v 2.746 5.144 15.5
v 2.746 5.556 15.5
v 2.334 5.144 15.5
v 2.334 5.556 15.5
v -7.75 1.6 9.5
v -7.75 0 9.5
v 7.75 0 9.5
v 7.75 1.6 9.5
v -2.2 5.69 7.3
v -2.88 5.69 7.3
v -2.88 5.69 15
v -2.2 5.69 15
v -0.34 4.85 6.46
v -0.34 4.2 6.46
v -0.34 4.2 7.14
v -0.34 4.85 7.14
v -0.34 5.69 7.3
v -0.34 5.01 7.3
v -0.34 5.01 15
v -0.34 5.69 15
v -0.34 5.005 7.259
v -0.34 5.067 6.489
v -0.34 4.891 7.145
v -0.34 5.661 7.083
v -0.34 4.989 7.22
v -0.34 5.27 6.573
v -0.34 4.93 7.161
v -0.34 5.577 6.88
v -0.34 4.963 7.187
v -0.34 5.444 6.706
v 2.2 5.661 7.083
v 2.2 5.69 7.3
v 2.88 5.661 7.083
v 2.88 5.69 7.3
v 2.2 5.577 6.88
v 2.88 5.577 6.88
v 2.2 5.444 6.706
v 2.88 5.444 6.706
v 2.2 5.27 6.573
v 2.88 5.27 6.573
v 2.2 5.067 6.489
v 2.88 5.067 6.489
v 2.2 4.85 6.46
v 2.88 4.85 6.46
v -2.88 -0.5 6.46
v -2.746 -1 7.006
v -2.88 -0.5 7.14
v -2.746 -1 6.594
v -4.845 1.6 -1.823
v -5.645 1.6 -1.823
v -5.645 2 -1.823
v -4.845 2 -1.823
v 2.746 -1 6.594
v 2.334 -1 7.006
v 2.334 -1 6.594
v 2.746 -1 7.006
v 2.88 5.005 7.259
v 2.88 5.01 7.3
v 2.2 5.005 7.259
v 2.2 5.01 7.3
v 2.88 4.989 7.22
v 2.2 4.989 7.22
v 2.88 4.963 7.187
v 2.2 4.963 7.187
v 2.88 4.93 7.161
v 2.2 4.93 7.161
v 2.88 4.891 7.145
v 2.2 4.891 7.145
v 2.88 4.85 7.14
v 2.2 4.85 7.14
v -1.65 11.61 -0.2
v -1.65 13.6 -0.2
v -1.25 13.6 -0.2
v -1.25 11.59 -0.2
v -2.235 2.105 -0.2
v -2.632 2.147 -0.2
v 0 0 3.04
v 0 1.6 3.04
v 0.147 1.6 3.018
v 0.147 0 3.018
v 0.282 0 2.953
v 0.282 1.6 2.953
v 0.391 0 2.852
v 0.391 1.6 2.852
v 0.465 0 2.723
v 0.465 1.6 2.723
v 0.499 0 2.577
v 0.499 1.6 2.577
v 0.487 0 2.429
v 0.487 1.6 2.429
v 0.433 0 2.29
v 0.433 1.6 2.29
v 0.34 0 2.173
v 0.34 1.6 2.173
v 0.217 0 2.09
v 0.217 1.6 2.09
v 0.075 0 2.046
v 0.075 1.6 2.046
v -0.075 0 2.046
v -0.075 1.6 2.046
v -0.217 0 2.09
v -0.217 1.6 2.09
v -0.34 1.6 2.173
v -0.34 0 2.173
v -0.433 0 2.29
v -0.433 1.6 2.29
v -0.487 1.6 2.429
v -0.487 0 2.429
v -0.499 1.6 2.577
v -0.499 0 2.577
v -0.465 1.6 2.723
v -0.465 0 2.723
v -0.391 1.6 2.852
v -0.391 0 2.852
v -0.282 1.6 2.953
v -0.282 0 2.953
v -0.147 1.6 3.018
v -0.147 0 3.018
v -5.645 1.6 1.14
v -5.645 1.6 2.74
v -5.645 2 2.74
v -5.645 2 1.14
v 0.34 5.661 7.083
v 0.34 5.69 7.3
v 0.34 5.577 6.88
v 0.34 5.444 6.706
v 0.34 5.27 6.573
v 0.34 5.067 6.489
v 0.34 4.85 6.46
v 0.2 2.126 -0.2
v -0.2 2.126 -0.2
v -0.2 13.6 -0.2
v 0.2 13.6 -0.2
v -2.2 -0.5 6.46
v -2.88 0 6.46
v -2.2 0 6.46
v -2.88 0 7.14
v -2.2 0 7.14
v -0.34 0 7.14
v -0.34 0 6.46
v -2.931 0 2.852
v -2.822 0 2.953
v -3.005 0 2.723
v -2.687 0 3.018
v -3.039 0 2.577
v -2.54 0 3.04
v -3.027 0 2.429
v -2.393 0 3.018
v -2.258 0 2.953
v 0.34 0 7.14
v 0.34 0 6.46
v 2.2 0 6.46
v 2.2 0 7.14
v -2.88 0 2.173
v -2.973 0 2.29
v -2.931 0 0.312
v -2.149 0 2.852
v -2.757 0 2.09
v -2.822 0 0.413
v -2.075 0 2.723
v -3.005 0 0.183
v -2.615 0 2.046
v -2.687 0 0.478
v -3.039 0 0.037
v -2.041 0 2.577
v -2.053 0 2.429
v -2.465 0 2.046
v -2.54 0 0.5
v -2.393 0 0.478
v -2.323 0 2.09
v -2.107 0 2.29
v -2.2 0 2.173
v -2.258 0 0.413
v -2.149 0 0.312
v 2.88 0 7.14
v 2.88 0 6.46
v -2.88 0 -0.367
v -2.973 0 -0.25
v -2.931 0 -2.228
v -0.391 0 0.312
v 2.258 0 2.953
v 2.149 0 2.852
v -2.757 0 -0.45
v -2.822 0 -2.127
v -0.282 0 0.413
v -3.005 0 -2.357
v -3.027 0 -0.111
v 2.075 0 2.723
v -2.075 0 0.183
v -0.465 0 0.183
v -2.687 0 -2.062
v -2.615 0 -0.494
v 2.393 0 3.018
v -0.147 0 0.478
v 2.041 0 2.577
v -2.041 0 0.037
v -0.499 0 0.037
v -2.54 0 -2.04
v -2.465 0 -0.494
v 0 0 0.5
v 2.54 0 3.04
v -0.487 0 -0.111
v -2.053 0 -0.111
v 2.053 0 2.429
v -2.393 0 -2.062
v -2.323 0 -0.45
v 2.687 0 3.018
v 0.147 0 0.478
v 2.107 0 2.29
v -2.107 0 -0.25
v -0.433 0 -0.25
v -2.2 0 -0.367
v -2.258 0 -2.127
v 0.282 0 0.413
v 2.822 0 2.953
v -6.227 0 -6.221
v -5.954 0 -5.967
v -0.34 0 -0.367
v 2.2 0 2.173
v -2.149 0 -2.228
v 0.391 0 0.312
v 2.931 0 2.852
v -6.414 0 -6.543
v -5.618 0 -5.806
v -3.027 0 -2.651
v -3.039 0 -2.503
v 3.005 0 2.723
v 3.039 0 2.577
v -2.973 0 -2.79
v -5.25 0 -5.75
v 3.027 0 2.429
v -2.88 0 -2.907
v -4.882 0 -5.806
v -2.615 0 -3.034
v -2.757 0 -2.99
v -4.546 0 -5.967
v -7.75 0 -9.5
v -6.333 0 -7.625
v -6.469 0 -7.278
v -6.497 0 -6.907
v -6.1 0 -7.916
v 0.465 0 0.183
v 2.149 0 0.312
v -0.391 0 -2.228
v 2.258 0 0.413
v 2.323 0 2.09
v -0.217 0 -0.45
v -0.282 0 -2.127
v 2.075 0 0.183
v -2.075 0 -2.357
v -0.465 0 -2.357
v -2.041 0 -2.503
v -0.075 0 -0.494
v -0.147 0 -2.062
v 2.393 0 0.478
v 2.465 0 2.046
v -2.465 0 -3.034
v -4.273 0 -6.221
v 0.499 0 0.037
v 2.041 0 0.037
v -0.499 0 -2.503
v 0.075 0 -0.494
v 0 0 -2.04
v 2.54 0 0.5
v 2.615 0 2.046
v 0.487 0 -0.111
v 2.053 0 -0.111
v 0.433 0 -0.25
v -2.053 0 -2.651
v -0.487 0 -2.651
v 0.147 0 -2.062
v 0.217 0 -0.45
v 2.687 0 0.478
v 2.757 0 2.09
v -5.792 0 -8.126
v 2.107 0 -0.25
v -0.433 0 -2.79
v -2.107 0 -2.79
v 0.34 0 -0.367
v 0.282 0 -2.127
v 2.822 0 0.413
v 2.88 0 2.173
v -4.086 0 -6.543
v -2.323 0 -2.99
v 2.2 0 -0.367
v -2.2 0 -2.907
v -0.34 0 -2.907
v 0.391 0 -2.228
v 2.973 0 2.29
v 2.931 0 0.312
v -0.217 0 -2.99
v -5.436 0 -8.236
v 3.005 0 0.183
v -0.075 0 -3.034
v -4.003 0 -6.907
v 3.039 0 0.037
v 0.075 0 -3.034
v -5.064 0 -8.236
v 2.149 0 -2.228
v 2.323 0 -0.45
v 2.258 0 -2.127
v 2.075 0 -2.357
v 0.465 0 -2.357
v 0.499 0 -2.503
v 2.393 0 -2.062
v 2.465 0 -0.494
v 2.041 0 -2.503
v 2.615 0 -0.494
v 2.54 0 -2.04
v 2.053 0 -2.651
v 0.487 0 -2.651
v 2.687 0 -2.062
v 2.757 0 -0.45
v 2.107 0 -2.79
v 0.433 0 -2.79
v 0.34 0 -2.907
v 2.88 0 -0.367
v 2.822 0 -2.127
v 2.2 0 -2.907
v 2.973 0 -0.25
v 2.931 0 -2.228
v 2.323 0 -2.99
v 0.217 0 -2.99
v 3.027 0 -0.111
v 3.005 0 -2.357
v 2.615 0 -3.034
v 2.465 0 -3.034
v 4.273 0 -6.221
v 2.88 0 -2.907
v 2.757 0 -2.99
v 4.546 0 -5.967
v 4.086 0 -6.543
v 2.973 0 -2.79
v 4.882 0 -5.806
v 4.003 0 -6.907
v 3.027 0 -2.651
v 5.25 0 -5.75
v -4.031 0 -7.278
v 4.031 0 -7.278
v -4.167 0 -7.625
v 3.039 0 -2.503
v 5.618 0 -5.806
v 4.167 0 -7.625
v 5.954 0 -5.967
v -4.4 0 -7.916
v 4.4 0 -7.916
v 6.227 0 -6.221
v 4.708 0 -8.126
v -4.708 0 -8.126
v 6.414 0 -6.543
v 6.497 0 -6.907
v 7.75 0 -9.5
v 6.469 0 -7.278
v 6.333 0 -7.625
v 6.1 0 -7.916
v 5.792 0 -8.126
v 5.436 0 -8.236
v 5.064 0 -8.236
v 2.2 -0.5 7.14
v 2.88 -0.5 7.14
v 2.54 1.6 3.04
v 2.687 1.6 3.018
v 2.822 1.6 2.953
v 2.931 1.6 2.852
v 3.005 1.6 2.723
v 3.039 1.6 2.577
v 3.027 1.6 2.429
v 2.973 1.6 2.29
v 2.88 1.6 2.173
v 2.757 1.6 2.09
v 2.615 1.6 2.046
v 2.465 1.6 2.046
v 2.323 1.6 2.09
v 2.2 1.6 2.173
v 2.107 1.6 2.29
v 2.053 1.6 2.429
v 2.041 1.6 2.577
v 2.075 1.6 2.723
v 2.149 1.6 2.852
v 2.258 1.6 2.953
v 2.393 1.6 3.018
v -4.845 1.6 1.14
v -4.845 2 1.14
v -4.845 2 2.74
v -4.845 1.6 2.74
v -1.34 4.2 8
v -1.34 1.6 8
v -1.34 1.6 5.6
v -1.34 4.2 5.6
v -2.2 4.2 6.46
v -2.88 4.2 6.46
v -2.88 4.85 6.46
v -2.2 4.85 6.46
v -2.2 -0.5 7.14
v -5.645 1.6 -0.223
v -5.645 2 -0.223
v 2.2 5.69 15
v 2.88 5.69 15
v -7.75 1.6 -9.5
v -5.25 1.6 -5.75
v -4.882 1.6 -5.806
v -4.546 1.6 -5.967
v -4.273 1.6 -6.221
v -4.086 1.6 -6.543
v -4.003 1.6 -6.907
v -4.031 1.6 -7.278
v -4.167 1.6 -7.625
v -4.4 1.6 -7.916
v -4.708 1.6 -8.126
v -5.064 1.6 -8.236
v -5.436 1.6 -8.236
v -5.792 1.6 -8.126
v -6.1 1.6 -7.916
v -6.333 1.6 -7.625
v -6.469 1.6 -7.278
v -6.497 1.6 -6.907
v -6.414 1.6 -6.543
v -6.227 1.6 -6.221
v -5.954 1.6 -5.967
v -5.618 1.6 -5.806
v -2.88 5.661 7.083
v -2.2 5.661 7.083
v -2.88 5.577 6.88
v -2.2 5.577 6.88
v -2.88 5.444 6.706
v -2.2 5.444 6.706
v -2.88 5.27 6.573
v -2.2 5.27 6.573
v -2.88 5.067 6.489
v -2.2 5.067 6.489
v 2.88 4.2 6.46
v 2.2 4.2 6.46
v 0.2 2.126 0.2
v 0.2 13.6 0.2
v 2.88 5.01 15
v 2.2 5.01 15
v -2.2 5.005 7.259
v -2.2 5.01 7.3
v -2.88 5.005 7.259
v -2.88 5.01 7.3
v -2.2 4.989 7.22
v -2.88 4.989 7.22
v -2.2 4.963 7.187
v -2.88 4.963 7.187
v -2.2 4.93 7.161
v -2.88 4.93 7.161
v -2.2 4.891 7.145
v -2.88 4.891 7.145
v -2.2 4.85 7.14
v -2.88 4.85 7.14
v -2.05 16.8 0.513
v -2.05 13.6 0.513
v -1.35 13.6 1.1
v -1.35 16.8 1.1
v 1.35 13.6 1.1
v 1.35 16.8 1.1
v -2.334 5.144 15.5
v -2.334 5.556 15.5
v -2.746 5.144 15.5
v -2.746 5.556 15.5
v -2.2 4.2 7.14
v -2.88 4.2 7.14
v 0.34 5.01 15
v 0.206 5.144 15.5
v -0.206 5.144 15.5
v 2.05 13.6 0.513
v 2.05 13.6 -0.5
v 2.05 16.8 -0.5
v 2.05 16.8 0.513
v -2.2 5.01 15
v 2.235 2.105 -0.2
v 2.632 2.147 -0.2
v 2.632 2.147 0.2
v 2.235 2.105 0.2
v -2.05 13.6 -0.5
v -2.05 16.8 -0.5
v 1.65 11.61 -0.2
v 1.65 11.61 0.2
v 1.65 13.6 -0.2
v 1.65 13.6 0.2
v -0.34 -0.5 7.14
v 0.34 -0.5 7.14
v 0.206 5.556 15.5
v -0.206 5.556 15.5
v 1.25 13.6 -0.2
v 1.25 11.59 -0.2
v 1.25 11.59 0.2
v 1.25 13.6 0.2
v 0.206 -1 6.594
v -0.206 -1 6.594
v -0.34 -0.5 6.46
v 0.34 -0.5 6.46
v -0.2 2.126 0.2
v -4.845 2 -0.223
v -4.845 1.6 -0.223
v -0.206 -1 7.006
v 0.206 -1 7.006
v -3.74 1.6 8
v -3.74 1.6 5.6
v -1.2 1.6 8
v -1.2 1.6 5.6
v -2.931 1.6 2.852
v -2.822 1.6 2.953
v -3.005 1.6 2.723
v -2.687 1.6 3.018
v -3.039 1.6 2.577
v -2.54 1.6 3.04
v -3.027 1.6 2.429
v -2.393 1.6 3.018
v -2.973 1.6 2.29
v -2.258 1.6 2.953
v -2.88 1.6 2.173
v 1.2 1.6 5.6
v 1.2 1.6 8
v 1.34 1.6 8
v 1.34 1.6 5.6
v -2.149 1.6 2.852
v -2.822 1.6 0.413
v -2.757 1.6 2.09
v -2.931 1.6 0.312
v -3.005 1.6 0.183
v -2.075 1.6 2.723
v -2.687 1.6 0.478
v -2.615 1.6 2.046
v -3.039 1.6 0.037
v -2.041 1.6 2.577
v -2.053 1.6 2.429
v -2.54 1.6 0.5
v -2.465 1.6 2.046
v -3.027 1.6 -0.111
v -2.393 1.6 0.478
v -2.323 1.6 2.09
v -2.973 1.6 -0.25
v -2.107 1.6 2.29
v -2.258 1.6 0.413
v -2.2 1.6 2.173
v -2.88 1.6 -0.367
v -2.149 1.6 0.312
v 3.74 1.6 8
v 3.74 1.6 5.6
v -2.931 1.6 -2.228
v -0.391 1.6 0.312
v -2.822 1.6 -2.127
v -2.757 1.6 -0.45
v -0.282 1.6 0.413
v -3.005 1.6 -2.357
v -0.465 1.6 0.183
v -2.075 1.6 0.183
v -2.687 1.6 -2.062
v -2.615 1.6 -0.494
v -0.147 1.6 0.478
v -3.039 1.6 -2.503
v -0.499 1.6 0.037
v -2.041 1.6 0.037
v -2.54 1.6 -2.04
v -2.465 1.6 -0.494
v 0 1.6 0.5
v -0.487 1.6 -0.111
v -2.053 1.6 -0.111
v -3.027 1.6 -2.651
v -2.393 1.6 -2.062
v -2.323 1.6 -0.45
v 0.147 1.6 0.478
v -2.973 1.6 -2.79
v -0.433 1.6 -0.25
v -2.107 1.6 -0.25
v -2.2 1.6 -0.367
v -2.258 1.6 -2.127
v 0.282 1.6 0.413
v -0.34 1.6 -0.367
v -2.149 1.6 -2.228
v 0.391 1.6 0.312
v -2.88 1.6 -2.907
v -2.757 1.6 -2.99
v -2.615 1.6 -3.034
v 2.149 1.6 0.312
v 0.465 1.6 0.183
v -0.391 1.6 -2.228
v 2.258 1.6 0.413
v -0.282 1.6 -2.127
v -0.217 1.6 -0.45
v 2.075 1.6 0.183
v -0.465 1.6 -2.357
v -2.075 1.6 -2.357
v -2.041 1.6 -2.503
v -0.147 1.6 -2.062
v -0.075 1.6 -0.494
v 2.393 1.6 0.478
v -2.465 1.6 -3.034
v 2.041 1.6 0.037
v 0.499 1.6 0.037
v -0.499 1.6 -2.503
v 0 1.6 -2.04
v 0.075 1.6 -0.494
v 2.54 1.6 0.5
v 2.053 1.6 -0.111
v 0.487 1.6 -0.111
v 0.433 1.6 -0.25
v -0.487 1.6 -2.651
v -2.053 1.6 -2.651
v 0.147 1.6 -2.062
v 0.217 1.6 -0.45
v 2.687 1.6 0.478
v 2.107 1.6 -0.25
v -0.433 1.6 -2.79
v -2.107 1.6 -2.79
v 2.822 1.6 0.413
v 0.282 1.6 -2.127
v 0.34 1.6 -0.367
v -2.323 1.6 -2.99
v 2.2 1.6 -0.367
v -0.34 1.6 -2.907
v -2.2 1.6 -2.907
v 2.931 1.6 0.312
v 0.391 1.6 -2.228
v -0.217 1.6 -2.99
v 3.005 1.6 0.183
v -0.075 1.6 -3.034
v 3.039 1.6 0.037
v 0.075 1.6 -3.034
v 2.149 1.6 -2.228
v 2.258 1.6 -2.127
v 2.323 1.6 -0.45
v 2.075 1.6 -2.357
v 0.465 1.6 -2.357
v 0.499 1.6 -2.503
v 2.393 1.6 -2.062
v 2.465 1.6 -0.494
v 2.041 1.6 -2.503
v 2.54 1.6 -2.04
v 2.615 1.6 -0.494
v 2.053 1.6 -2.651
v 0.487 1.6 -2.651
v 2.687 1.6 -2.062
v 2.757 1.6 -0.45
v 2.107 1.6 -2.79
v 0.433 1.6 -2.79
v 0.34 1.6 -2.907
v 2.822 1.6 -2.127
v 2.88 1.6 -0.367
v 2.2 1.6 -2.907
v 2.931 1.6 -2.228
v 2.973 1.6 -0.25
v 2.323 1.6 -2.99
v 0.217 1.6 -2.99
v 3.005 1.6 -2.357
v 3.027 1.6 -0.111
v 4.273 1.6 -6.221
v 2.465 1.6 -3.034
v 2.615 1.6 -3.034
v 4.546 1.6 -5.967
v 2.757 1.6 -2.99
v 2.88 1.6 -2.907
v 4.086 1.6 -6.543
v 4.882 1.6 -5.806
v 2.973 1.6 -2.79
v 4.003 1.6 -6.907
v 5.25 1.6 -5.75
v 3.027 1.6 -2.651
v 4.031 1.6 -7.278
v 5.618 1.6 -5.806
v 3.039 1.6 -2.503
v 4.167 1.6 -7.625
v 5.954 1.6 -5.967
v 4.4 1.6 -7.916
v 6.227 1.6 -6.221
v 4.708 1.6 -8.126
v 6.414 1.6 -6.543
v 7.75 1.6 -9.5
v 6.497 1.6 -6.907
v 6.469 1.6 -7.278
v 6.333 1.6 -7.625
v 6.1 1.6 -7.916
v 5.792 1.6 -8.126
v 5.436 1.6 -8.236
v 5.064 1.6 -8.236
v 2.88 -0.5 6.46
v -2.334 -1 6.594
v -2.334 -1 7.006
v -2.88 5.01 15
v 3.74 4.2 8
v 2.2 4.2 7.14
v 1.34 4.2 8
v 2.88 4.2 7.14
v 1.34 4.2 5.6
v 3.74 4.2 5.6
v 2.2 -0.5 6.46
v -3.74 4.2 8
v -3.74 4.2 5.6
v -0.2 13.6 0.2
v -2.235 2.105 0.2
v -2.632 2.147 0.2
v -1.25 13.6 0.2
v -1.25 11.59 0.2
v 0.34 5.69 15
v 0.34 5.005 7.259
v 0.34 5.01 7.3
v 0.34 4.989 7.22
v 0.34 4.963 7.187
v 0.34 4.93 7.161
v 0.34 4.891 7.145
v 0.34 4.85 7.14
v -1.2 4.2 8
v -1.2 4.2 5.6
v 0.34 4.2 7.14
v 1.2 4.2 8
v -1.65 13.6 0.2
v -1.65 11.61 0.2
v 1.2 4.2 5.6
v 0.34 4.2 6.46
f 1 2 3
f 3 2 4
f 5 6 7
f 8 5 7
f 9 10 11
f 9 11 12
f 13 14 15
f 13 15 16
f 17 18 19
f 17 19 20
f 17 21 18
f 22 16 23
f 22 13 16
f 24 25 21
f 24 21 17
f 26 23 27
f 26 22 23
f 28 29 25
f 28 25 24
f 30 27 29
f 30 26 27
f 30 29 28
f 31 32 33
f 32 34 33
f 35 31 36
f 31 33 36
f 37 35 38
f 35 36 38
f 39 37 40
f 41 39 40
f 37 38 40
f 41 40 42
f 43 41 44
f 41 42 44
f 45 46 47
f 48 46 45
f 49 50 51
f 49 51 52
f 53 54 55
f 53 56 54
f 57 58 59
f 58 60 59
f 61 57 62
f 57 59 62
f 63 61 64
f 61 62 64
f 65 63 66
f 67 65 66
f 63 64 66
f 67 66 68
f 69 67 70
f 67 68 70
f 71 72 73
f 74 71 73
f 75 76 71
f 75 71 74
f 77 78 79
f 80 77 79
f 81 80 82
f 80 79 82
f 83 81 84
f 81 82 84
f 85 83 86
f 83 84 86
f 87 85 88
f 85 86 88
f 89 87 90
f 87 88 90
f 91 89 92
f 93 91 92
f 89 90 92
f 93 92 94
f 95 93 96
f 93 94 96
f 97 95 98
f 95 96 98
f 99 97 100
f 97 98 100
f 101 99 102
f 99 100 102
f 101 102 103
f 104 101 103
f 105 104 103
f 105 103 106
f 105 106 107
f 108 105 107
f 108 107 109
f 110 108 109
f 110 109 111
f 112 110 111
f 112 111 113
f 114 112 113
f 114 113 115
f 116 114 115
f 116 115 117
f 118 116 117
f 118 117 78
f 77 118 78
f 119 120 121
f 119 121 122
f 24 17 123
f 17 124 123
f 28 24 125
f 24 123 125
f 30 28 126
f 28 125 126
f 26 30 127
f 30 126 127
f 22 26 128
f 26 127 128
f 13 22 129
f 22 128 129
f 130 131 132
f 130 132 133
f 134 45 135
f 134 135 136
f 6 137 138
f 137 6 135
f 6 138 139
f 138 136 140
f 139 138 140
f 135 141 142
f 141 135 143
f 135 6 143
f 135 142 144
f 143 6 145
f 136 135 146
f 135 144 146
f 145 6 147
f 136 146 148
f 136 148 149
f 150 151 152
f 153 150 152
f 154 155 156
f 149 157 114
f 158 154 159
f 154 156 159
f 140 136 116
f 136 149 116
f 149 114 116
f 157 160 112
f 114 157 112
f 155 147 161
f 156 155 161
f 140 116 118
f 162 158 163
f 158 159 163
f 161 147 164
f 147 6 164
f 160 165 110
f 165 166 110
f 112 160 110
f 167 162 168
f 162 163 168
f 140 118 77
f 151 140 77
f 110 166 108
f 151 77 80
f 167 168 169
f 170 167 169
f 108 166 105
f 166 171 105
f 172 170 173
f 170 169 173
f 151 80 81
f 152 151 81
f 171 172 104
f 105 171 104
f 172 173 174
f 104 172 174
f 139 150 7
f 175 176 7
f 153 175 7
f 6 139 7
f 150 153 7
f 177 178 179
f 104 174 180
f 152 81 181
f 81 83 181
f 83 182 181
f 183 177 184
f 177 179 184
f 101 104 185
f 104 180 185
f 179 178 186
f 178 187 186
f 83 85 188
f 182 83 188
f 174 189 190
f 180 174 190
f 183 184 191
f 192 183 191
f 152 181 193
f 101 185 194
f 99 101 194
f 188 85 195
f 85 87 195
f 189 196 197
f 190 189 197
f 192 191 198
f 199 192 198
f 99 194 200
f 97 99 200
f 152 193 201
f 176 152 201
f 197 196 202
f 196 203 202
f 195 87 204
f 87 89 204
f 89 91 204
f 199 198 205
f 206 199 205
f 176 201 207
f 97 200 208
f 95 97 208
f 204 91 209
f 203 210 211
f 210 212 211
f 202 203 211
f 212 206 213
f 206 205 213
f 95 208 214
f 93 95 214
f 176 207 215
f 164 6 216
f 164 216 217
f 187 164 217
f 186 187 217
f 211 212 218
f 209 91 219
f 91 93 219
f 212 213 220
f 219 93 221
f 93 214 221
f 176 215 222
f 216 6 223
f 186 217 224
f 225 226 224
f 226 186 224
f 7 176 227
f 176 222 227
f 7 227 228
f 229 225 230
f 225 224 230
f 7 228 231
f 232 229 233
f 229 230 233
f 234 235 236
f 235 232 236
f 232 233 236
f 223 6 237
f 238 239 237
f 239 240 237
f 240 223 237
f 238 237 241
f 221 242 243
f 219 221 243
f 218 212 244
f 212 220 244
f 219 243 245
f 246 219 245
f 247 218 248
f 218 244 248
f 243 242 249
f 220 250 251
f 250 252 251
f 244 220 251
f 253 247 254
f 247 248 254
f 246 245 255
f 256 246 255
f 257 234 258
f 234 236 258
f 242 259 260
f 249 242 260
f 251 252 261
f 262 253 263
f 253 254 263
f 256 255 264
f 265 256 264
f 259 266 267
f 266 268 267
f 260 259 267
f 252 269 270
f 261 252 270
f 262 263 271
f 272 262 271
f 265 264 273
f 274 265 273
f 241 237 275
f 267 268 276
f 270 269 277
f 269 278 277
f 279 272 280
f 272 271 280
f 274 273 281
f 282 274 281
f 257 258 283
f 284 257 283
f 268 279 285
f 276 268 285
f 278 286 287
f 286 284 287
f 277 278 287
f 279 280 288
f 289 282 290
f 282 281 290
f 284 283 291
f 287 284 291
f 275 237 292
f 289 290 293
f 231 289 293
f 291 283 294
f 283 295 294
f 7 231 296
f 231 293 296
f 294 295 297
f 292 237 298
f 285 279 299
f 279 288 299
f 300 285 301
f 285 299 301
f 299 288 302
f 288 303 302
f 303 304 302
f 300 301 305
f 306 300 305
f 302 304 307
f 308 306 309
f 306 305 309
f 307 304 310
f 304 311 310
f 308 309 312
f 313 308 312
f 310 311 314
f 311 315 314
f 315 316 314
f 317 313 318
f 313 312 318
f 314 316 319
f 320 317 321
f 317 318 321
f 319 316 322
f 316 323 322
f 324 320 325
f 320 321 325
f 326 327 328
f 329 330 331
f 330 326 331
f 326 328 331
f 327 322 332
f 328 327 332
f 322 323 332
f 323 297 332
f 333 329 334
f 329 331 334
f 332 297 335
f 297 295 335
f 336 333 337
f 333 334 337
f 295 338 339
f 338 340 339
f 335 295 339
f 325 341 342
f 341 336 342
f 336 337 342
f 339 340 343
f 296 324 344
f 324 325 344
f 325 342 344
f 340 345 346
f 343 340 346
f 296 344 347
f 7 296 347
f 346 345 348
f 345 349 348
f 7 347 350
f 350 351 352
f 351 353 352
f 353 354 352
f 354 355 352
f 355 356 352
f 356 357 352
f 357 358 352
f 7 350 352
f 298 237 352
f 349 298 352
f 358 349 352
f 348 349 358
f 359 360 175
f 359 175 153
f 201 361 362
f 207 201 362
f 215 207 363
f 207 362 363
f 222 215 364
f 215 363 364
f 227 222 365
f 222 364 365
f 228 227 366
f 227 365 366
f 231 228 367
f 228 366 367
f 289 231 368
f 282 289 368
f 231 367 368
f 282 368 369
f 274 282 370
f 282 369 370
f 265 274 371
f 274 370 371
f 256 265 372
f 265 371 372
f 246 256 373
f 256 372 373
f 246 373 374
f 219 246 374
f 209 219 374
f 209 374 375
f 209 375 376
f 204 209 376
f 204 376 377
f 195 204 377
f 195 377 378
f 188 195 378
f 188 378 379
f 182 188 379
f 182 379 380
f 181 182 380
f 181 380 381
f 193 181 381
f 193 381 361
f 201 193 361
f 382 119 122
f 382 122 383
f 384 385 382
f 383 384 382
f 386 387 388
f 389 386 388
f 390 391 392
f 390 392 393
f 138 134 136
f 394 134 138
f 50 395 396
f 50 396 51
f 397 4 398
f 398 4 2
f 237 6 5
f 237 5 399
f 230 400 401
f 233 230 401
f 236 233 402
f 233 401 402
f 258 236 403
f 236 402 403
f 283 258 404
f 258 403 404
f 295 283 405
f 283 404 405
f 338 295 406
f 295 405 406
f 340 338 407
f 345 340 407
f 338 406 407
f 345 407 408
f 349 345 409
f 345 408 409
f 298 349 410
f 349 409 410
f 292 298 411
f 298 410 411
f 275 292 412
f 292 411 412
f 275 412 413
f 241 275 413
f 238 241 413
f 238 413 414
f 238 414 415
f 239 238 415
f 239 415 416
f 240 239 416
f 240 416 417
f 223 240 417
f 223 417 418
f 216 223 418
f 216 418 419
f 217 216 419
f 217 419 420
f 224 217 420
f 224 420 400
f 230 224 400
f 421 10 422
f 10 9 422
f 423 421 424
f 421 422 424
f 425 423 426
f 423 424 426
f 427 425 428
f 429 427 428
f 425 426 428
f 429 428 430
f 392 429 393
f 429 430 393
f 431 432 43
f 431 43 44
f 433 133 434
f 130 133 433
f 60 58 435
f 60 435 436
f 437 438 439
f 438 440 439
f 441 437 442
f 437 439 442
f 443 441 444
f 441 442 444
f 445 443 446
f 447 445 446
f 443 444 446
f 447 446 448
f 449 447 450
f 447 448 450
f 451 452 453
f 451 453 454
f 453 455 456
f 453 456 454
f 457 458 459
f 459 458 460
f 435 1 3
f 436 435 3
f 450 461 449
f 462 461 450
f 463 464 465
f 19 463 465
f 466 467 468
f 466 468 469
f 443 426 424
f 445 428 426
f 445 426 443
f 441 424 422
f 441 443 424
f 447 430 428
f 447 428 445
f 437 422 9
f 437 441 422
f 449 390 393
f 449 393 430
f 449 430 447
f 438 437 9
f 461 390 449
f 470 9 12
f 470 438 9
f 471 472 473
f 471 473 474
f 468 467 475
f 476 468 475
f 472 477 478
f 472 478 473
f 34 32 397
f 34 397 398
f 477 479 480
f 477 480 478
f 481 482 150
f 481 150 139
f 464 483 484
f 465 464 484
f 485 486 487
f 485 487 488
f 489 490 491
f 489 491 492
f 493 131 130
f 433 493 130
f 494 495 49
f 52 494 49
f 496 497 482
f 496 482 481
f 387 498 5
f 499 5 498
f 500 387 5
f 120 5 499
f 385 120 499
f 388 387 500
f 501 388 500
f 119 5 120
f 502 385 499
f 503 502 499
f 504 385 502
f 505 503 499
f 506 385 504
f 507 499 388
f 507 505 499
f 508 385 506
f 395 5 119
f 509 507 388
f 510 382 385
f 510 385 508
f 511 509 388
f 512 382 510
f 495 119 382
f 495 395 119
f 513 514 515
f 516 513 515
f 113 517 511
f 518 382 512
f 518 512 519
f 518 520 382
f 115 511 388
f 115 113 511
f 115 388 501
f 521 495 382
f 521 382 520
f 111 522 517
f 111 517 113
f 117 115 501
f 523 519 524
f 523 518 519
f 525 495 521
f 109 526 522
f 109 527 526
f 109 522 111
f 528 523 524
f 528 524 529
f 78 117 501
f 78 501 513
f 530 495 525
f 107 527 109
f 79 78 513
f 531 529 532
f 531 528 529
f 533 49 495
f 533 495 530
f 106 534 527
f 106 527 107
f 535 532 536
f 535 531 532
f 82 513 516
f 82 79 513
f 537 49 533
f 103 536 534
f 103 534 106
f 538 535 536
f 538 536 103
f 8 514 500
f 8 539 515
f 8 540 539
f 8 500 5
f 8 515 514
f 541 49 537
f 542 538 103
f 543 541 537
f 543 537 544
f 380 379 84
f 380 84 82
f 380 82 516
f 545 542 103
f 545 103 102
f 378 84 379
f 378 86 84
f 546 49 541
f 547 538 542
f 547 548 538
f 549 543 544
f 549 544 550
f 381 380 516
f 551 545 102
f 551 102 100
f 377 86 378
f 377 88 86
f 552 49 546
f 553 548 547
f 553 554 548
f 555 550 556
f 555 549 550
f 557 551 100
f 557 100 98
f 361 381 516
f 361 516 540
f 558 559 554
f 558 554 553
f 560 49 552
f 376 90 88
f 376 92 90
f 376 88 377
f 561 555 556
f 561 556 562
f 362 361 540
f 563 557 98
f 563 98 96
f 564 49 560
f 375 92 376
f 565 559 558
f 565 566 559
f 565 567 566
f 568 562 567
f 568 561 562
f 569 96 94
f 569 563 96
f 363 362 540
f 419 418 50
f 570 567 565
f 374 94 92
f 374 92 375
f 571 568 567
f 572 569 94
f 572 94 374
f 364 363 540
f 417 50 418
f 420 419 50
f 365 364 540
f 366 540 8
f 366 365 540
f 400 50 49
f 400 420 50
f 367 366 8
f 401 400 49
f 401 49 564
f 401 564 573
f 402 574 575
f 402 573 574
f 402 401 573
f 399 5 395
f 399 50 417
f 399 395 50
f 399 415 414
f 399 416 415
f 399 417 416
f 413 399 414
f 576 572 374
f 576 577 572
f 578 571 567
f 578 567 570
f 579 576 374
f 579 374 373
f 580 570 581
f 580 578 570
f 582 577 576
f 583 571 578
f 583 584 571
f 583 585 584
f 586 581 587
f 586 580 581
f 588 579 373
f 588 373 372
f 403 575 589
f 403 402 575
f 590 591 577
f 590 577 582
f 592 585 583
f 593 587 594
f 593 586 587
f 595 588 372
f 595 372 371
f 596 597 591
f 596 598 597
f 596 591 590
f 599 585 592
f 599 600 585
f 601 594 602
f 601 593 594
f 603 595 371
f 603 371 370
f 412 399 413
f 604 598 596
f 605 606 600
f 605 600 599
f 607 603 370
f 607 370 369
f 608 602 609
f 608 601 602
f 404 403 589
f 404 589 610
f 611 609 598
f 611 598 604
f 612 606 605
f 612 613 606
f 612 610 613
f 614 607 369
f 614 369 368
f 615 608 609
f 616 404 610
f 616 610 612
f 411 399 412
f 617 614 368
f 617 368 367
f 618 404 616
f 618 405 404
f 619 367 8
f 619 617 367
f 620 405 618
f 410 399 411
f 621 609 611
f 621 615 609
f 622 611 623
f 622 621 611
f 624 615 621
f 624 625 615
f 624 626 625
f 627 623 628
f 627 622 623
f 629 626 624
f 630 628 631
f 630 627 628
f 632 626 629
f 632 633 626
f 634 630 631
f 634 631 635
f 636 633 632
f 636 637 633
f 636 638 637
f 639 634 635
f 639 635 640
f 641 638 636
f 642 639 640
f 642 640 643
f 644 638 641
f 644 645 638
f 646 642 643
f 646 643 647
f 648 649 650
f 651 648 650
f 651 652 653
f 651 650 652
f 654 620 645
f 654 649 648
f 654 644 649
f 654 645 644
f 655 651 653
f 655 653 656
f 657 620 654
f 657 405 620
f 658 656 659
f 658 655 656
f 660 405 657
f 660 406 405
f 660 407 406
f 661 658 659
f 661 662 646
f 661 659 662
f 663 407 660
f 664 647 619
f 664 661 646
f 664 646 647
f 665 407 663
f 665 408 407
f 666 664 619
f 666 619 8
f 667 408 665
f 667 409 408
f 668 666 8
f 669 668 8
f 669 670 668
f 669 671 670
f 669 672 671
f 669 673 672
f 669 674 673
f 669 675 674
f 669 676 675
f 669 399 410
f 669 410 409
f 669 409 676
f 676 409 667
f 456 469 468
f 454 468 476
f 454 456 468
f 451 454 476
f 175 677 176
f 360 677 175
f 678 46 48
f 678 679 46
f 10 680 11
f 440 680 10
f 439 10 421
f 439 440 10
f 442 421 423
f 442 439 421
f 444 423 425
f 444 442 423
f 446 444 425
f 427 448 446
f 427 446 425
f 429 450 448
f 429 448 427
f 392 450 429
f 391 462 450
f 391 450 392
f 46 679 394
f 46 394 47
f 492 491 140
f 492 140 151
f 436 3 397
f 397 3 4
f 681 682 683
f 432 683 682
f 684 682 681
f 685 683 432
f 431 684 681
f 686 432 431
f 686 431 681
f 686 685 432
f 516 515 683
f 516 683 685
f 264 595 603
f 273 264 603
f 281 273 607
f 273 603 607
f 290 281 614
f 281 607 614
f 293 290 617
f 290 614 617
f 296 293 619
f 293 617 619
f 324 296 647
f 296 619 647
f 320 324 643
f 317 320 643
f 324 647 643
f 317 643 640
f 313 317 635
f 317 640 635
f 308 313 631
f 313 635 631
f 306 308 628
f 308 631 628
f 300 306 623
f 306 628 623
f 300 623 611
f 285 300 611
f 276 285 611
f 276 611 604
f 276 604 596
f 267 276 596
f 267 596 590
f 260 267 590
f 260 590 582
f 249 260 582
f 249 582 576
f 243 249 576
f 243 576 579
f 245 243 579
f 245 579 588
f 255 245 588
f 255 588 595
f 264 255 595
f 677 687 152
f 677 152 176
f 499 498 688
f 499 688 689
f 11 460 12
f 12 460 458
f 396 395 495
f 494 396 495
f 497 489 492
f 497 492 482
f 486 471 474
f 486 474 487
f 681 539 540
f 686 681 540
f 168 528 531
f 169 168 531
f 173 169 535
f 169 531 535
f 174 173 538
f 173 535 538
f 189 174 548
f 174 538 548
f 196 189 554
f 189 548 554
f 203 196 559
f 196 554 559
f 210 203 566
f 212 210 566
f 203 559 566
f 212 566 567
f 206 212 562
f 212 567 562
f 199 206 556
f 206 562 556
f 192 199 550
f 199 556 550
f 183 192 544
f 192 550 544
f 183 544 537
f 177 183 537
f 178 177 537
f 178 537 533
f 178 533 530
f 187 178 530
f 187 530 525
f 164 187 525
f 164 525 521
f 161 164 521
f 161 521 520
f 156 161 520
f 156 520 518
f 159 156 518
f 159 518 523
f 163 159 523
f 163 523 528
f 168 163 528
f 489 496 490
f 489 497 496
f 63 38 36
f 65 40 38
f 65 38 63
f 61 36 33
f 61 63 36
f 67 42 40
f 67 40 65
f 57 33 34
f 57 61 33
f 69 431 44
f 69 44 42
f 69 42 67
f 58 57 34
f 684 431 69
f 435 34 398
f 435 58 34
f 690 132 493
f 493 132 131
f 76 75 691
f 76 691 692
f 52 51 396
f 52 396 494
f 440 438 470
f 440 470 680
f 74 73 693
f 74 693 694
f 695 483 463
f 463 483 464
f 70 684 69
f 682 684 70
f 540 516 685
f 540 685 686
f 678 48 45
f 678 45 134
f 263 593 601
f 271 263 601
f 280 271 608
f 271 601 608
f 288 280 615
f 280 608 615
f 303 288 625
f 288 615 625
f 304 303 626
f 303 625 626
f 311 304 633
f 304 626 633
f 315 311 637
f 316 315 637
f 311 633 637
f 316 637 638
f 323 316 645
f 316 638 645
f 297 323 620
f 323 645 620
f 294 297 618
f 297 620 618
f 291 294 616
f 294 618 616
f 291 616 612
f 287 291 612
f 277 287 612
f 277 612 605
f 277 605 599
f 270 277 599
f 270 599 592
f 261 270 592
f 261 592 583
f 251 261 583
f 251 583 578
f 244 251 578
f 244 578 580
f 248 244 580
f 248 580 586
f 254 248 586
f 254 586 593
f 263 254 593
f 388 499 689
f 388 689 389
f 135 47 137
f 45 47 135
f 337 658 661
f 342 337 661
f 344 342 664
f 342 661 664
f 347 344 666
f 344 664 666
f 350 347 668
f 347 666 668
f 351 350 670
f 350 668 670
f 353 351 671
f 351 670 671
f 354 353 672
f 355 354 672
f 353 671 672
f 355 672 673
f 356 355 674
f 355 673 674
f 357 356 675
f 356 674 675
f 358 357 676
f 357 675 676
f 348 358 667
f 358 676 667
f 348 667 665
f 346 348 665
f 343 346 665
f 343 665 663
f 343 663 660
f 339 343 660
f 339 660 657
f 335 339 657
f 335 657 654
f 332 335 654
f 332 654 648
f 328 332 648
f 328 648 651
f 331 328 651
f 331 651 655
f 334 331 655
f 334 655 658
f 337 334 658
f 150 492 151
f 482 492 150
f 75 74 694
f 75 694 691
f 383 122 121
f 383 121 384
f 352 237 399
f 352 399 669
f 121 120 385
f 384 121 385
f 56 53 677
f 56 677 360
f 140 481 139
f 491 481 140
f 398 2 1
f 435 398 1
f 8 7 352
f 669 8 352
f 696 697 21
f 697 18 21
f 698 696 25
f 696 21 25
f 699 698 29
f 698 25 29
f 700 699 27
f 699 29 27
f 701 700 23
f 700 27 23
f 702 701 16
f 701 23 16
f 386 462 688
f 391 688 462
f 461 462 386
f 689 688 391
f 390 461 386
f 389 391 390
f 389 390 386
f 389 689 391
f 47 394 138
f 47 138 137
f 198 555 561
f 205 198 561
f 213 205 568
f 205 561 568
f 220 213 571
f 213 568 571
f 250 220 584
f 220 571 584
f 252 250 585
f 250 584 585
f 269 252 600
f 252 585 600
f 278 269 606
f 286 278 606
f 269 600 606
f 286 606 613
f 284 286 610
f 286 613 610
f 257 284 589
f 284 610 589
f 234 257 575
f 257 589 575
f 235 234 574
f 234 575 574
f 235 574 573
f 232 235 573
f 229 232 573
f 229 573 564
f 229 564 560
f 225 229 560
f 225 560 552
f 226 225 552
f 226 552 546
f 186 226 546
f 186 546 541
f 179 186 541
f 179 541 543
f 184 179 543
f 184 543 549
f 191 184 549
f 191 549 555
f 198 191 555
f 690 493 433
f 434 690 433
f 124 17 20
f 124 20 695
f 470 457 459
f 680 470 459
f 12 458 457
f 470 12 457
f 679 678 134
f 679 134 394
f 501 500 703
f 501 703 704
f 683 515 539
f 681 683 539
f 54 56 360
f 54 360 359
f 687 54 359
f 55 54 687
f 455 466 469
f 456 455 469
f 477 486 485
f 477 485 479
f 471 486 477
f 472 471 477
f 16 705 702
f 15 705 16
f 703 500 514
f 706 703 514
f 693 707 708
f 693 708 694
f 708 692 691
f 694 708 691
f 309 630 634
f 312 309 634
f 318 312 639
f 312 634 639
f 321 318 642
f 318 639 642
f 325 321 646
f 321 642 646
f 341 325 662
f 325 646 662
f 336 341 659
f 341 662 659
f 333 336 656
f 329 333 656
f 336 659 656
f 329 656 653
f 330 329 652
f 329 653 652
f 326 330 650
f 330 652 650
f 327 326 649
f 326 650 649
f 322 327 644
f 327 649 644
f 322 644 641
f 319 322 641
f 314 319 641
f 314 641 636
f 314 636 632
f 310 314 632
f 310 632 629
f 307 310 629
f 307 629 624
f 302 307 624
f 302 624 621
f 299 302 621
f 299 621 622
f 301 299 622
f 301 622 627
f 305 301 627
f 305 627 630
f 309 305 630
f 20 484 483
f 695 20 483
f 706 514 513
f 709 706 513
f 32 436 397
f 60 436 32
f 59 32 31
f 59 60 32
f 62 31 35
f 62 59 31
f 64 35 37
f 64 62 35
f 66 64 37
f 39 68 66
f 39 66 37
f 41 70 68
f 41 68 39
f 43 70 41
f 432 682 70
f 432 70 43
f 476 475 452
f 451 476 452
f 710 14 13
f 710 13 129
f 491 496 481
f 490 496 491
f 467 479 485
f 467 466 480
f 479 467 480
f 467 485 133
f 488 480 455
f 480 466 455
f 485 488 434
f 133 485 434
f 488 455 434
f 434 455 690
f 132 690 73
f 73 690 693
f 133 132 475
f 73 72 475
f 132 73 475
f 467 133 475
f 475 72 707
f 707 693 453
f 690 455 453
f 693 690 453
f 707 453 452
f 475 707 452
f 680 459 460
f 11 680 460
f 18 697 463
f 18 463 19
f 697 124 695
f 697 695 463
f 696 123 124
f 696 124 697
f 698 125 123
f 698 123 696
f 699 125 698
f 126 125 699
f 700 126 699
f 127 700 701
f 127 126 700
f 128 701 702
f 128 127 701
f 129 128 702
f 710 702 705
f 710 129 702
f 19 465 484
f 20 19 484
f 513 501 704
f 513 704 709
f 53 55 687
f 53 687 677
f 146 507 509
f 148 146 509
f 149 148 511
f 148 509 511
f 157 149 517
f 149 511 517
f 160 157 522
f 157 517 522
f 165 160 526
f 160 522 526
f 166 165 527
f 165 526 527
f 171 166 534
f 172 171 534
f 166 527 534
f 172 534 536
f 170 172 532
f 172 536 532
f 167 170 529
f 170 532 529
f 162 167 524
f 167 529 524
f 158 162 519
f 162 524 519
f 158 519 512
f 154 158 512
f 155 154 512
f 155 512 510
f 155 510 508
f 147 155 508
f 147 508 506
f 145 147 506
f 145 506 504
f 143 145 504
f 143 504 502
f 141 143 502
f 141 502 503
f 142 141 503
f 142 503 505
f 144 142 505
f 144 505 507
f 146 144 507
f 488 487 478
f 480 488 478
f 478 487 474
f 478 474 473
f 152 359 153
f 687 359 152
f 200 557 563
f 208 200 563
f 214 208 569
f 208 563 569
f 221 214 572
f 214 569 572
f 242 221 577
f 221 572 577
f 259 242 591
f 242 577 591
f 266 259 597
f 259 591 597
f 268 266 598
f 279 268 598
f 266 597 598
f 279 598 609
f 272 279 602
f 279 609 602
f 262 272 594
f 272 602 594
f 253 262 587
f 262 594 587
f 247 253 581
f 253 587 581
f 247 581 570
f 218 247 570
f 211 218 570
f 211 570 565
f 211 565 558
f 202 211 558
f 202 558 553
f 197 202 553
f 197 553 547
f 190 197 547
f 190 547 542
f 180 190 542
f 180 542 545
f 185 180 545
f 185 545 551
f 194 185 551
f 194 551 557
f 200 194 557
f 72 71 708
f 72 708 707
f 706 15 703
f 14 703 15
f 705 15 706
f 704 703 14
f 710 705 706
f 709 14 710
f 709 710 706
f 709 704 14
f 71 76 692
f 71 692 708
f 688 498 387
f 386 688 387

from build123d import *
from OCP.BRepFilletAPI import BRepFilletAPI_MakeChamfer

# Parameters (mm, degrees)
SKETCH1_W             = 15.5
SKETCH1_H             = 19
BOSS_EXTRUDE1_DEPTH   = 1.6
SKETCH2_W             = 2.4
SKETCH2_H             = 2.4
BOSS_EXTRUDE2_DEPTH   = 2.6
SKETCH4_W             = 0.68
SKETCH4_H             = 0.68
SKETCH8_R             = 0.5
CUT_EXTRUDE2_DEPTH    = 18.80563394
CHAMFER1_SIZE         = 0.5
CHAMFER1_SIZE2        = 0.133974596
SKETCH5_R             = 1.25
CUT_EXTRUDE1_DEPTH    = 18.80563394
SKETCH6_W             = 4.1
SKETCH6_H             = 1.6
BOSS_EXTRUDE3_DEPTH   = 3.2
CHAMFER2_SIZE         = 0.7
CHAMFER2_SIZE2        = 0.587369742
BOSS_EXTRUDE4_START   = -0.3
SKETCH7_W             = 0.4
SKETCH7_H             = 11.973992441
BOSS_EXTRUDE4_DEPTH   = 0.4
SKETCH13_W            = 0.8
SKETCH13_H            = 1.6
BOSS_EXTRUDE5_DEPTH   = 0.4
BODY_MOVE_COPY1_ANGLE = 90


with BuildPart() as part:
    # Sketch1 → Boss-Extrude1 (new body)
    with BuildSketch(Plane(origin=(0, 0, 0), x_dir=(1, 0, 0), z_dir=(0, 1, 0))):
        Rectangle(SKETCH1_W, SKETCH1_H)
    extrude(amount=BOSS_EXTRUDE1_DEPTH)

    # Sketch2 → Boss-Extrude2 (add)
    with BuildSketch(Plane(origin=(0, 1.6, 0), x_dir=(1, 0, 0), z_dir=(0, 1, 0))):
        with Locations((0, -6.8)):
            Rectangle(SKETCH2_W, SKETCH2_H)
        with Locations((-2.54, -6.8)):
            Rectangle(SKETCH2_W, SKETCH2_H)
        with Locations((2.54, -6.8)):
            Rectangle(SKETCH2_W, SKETCH2_H)
    extrude(amount=BOSS_EXTRUDE2_DEPTH)

    # Sweep1: sweep along a path in Sketch3
    with BuildLine(Plane(origin=(0, 0, 0), x_dir=(0, 0, -1), z_dir=(1, 0, 0))) as sweep1_path:
        Line((-15.5, 5.35), (-7.3, 5.35))
        ThreePointArc((-7.3, 5.35), (-6.946446609, 5.203553391), (-6.8, 4.85))
        Line((-6.8, 4.85), (-6.8, -1))
    # Sketch4 → Sweep1 (sweep)
    with BuildSketch(Plane(origin=(0, 0, 15.5), x_dir=(-1, 0, 0), z_dir=(0, 0, -1))):
        with Locations((0, 5.35)):
            Rectangle(SKETCH4_W, SKETCH4_H)
        with Locations((2.54, 5.35)):
            Rectangle(SKETCH4_W, SKETCH4_H)
        with Locations((-2.54, 5.35)):
            Rectangle(SKETCH4_W, SKETCH4_H)
    sweep(path=sweep1_path.line)

    # Sketch8 → Cut-Extrude2 (cut, through all)
    with BuildSketch(Plane(origin=(0, 1.6, 0), x_dir=(1, 0, 0), z_dir=(0, 1, 0))):
        with Locations(Location((-2.54, 2.54, 0), (0, 0, 270))):
            Circle(SKETCH8_R)
        with Locations(Location((0, 2.54, 0), (0, 0, 270))):
            Circle(SKETCH8_R)
        with Locations(Location((2.54, 2.54, 0), (0, 0, 270))):
            Circle(SKETCH8_R)
        with Locations(Location((0, 0, 0), (0, 0, 270))):
            Circle(SKETCH8_R)
        with Locations(Location((2.54, 0, 0), (0, 0, 270))):
            Circle(SKETCH8_R)
        with Locations(Location((0, -2.54, 0), (0, 0, 270))):
            Circle(SKETCH8_R)
        with Locations(Location((2.54, -2.54, 0), (0, 0, 270))):
            Circle(SKETCH8_R)
        with Locations(Location((-2.54, 0, 0), (0, 0, 270))):
            Circle(SKETCH8_R)
        with Locations(Location((-2.54, -2.54, 0), (0, 0, 270))):
            Circle(SKETCH8_R)
    extrude(amount=-CUT_EXTRUDE2_DEPTH, mode=Mode.SUBTRACT)

    # Chamfer1: one chamfer whose edges measure the first distance from different faces: ONE call of the kernel's chamfer builder (chamfer() names one face for all edges)
    chamfer1_edges_1 = [part.edges().sort_by_distance(p)[0] for p in [
        (2.2, -1, 6.8),
    ]]
    chamfer1_side_1 = [part.faces().sort_by_distance(p)[0] for p in [
        (2.2, -0.5, 6.8),
    ]]
    chamfer1_edges_2 = [part.edges().sort_by_distance(p)[0] for p in [
        (2.54, -1, 6.46),
    ]]
    chamfer1_side_2 = [part.faces().sort_by_distance(p)[0] for p in [
        (2.54, -0.5, 6.46),
    ]]
    chamfer1_edges_3 = [part.edges().sort_by_distance(p)[0] for p in [
        (2.88, -1, 6.8),
    ]]
    chamfer1_side_3 = [part.faces().sort_by_distance(p)[0] for p in [
        (2.88, -0.5, 6.8),
    ]]
    chamfer1_edges_4 = [part.edges().sort_by_distance(p)[0] for p in [
        (2.54, -1, 7.14),
    ]]
    chamfer1_side_4 = [part.faces().sort_by_distance(p)[0] for p in [
        (2.54, -0.5, 7.14),
    ]]
    chamfer1_edges_5 = [part.edges().sort_by_distance(p)[0] for p in [
        (2.88, 5.35, 15.5),
    ]]
    chamfer1_side_5 = [part.faces().sort_by_distance(p)[0] for p in [
        (2.88, 5.283535103, 10.725542578),
    ]]
    chamfer1_edges_6 = [part.edges().sort_by_distance(p)[0] for p in [
        (2.54, 5.01, 15.5),
    ]]
    chamfer1_side_6 = [part.faces().sort_by_distance(p)[0] for p in [
        (2.54, 5.01, 11.4),
    ]]
    chamfer1_edges_7 = [part.edges().sort_by_distance(p)[0] for p in [
        (2.2, 5.35, 15.5),
    ]]
    chamfer1_side_7 = [part.faces().sort_by_distance(p)[0] for p in [
        (2.2, 5.283535103, 10.725542578),
    ]]
    chamfer1_edges_8 = [part.edges().sort_by_distance(p)[0] for p in [
        (2.54, 5.69, 15.5),
    ]]
    chamfer1_side_8 = [part.faces().sort_by_distance(p)[0] for p in [
        (2.54, 5.69, 11.4),
    ]]
    chamfer1_edges_9 = [part.edges().sort_by_distance(p)[0] for p in [
        (-2.88, -1, 6.8),
    ]]
    chamfer1_side_9 = [part.faces().sort_by_distance(p)[0] for p in [
        (-2.88, -0.5, 6.8),
    ]]
    chamfer1_edges_10 = [part.edges().sort_by_distance(p)[0] for p in [
        (-2.54, -1, 6.46),
    ]]
    chamfer1_side_10 = [part.faces().sort_by_distance(p)[0] for p in [
        (-2.54, -0.5, 6.46),
    ]]
    chamfer1_edges_11 = [part.edges().sort_by_distance(p)[0] for p in [
        (-2.2, -1, 6.8),
    ]]
    chamfer1_side_11 = [part.faces().sort_by_distance(p)[0] for p in [
        (-2.2, -0.5, 6.8),
    ]]
    chamfer1_edges_12 = [part.edges().sort_by_distance(p)[0] for p in [
        (-2.54, -1, 7.14),
    ]]
    chamfer1_side_12 = [part.faces().sort_by_distance(p)[0] for p in [
        (-2.54, -0.5, 7.14),
    ]]
    chamfer1_edges_13 = [part.edges().sort_by_distance(p)[0] for p in [
        (-2.2, 5.35, 15.5),
    ]]
    chamfer1_side_13 = [part.faces().sort_by_distance(p)[0] for p in [
        (-2.2, 5.283535103, 10.725542578),
    ]]
    chamfer1_edges_14 = [part.edges().sort_by_distance(p)[0] for p in [
        (-2.54, 5.01, 15.5),
    ]]
    chamfer1_side_14 = [part.faces().sort_by_distance(p)[0] for p in [
        (-2.54, 5.01, 11.4),
    ]]
    chamfer1_edges_15 = [part.edges().sort_by_distance(p)[0] for p in [
        (-2.88, 5.35, 15.5),
    ]]
    chamfer1_side_15 = [part.faces().sort_by_distance(p)[0] for p in [
        (-2.88, 5.283535103, 10.725542578),
    ]]
    chamfer1_edges_16 = [part.edges().sort_by_distance(p)[0] for p in [
        (-2.54, 5.69, 15.5),
    ]]
    chamfer1_side_16 = [part.faces().sort_by_distance(p)[0] for p in [
        (-2.54, 5.69, 11.4),
    ]]
    chamfer1_edges_17 = [part.edges().sort_by_distance(p)[0] for p in [
        (-0.34, -1, 6.8),
    ]]
    chamfer1_side_17 = [part.faces().sort_by_distance(p)[0] for p in [
        (-0.34, -0.5, 6.8),
    ]]
    chamfer1_edges_18 = [part.edges().sort_by_distance(p)[0] for p in [
        (0, -1, 6.46),
    ]]
    chamfer1_side_18 = [part.faces().sort_by_distance(p)[0] for p in [
        (0, -0.5, 6.46),
    ]]
    chamfer1_edges_19 = [part.edges().sort_by_distance(p)[0] for p in [
        (0.34, -1, 6.8),
    ]]
    chamfer1_side_19 = [part.faces().sort_by_distance(p)[0] for p in [
        (0.34, -0.5, 6.8),
    ]]
    chamfer1_edges_20 = [part.edges().sort_by_distance(p)[0] for p in [
        (0, -1, 7.14),
    ]]
    chamfer1_side_20 = [part.faces().sort_by_distance(p)[0] for p in [
        (0, -0.5, 7.14),
    ]]
    chamfer1_edges_21 = [part.edges().sort_by_distance(p)[0] for p in [
        (0.34, 5.35, 15.5),
    ]]
    chamfer1_side_21 = [part.faces().sort_by_distance(p)[0] for p in [
        (0.34, 5.283535103, 10.725542578),
    ]]
    chamfer1_edges_22 = [part.edges().sort_by_distance(p)[0] for p in [
        (0, 5.01, 15.5),
    ]]
    chamfer1_side_22 = [part.faces().sort_by_distance(p)[0] for p in [
        (0, 5.01, 11.4),
    ]]
    chamfer1_edges_23 = [part.edges().sort_by_distance(p)[0] for p in [
        (-0.34, 5.35, 15.5),
    ]]
    chamfer1_side_23 = [part.faces().sort_by_distance(p)[0] for p in [
        (-0.34, 5.283535103, 10.725542578),
    ]]
    chamfer1_edges_24 = [part.edges().sort_by_distance(p)[0] for p in [
        (0, 5.69, 15.5),
    ]]
    chamfer1_side_24 = [part.faces().sort_by_distance(p)[0] for p in [
        (0, 5.69, 11.4),
    ]]
    chamfer1 = BRepFilletAPI_MakeChamfer(part.part.solid().wrapped)
    for e in chamfer1_edges_1:
        chamfer1.Add(CHAMFER1_SIZE, CHAMFER1_SIZE2, e.wrapped, chamfer1_side_1[0].wrapped)  # the first distance lies on this face
    for e in chamfer1_edges_2:
        chamfer1.Add(CHAMFER1_SIZE, CHAMFER1_SIZE2, e.wrapped, chamfer1_side_2[0].wrapped)  # the first distance lies on this face
    for e in chamfer1_edges_3:
        chamfer1.Add(CHAMFER1_SIZE, CHAMFER1_SIZE2, e.wrapped, chamfer1_side_3[0].wrapped)  # the first distance lies on this face
    for e in chamfer1_edges_4:
        chamfer1.Add(CHAMFER1_SIZE, CHAMFER1_SIZE2, e.wrapped, chamfer1_side_4[0].wrapped)  # the first distance lies on this face
    for e in chamfer1_edges_5:
        chamfer1.Add(CHAMFER1_SIZE, CHAMFER1_SIZE2, e.wrapped, chamfer1_side_5[0].wrapped)  # the first distance lies on this face
    for e in chamfer1_edges_6:
        chamfer1.Add(CHAMFER1_SIZE, CHAMFER1_SIZE2, e.wrapped, chamfer1_side_6[0].wrapped)  # the first distance lies on this face
    for e in chamfer1_edges_7:
        chamfer1.Add(CHAMFER1_SIZE, CHAMFER1_SIZE2, e.wrapped, chamfer1_side_7[0].wrapped)  # the first distance lies on this face
    for e in chamfer1_edges_8:
        chamfer1.Add(CHAMFER1_SIZE, CHAMFER1_SIZE2, e.wrapped, chamfer1_side_8[0].wrapped)  # the first distance lies on this face
    for e in chamfer1_edges_9:
        chamfer1.Add(CHAMFER1_SIZE, CHAMFER1_SIZE2, e.wrapped, chamfer1_side_9[0].wrapped)  # the first distance lies on this face
    for e in chamfer1_edges_10:
        chamfer1.Add(CHAMFER1_SIZE, CHAMFER1_SIZE2, e.wrapped, chamfer1_side_10[0].wrapped)  # the first distance lies on this face
    for e in chamfer1_edges_11:
        chamfer1.Add(CHAMFER1_SIZE, CHAMFER1_SIZE2, e.wrapped, chamfer1_side_11[0].wrapped)  # the first distance lies on this face
    for e in chamfer1_edges_12:
        chamfer1.Add(CHAMFER1_SIZE, CHAMFER1_SIZE2, e.wrapped, chamfer1_side_12[0].wrapped)  # the first distance lies on this face
    for e in chamfer1_edges_13:
        chamfer1.Add(CHAMFER1_SIZE, CHAMFER1_SIZE2, e.wrapped, chamfer1_side_13[0].wrapped)  # the first distance lies on this face
    for e in chamfer1_edges_14:
        chamfer1.Add(CHAMFER1_SIZE, CHAMFER1_SIZE2, e.wrapped, chamfer1_side_14[0].wrapped)  # the first distance lies on this face
    for e in chamfer1_edges_15:
        chamfer1.Add(CHAMFER1_SIZE, CHAMFER1_SIZE2, e.wrapped, chamfer1_side_15[0].wrapped)  # the first distance lies on this face
    for e in chamfer1_edges_16:
        chamfer1.Add(CHAMFER1_SIZE, CHAMFER1_SIZE2, e.wrapped, chamfer1_side_16[0].wrapped)  # the first distance lies on this face
    for e in chamfer1_edges_17:
        chamfer1.Add(CHAMFER1_SIZE, CHAMFER1_SIZE2, e.wrapped, chamfer1_side_17[0].wrapped)  # the first distance lies on this face
    for e in chamfer1_edges_18:
        chamfer1.Add(CHAMFER1_SIZE, CHAMFER1_SIZE2, e.wrapped, chamfer1_side_18[0].wrapped)  # the first distance lies on this face
    for e in chamfer1_edges_19:
        chamfer1.Add(CHAMFER1_SIZE, CHAMFER1_SIZE2, e.wrapped, chamfer1_side_19[0].wrapped)  # the first distance lies on this face
    for e in chamfer1_edges_20:
        chamfer1.Add(CHAMFER1_SIZE, CHAMFER1_SIZE2, e.wrapped, chamfer1_side_20[0].wrapped)  # the first distance lies on this face
    for e in chamfer1_edges_21:
        chamfer1.Add(CHAMFER1_SIZE, CHAMFER1_SIZE2, e.wrapped, chamfer1_side_21[0].wrapped)  # the first distance lies on this face
    for e in chamfer1_edges_22:
        chamfer1.Add(CHAMFER1_SIZE, CHAMFER1_SIZE2, e.wrapped, chamfer1_side_22[0].wrapped)  # the first distance lies on this face
    for e in chamfer1_edges_23:
        chamfer1.Add(CHAMFER1_SIZE, CHAMFER1_SIZE2, e.wrapped, chamfer1_side_23[0].wrapped)  # the first distance lies on this face
    for e in chamfer1_edges_24:
        chamfer1.Add(CHAMFER1_SIZE, CHAMFER1_SIZE2, e.wrapped, chamfer1_side_24[0].wrapped)  # the first distance lies on this face
    add(Compound.cast(chamfer1.Shape()), mode=Mode.REPLACE)

    # Sketch5 → Cut-Extrude1 (cut, through all)
    with BuildSketch(Plane(origin=(0, 1.6, 0), x_dir=(1, 0, 0), z_dir=(0, 1, 0))):
        with Locations(Location((-5.25, 7, 0), (0, 0, 270))):
            Circle(SKETCH5_R)
        with Locations(Location((5.25, 7, 0), (0, 0, 270))):
            Circle(SKETCH5_R)
    extrude(amount=-CUT_EXTRUDE1_DEPTH, mode=Mode.SUBTRACT)

    # Sketch13 → Boss-Extrude5 (add)
    with BuildSketch(Plane(origin=(0, 1.6, 0), x_dir=(1, 0, 0), z_dir=(0, 1, 0))):
        with Locations((-5.245052358, 1.022726005)):
            Rectangle(SKETCH13_W, SKETCH13_H)
        with Locations((-5.245052358, -1.940051544)):
            Rectangle(SKETCH13_W, SKETCH13_H)
    extrude(amount=BOSS_EXTRUDE5_DEPTH)


with BuildPart() as body_2:
    # Sketch6 → Boss-Extrude3 (new body)
    with BuildSketch(Plane(origin=(0, 0, -12.5), x_dir=(-1, 0, 0), z_dir=(0, 0, -1))):
        with Locations((0, 2.8)):
            Rectangle(SKETCH6_W, SKETCH6_H)
    extrude(amount=BOSS_EXTRUDE3_DEPTH)

    # Chamfer2
    chamfer2_edges = [body_2.edges().sort_by_distance(p)[0] for p in [
        (2.05, 3.6, -14.1),
        (-2.05, 3.6, -14.1),
    ]]
    chamfer2_side = [body_2.faces().sort_by_distance(p)[0] for p in [
        (0, 3.6, -14.1),
    ]]
    chamfer(chamfer2_edges, length=CHAMFER2_SIZE, length2=CHAMFER2_SIZE2, reference=chamfer2_side[0])

    # Sketch7 → Boss-Extrude4 (add)
    with BuildSketch(Plane.XZ.offset(-2).offset(BOSS_EXTRUDE4_START)):
        Polygon((1.65, -12.5), (1.65, -10.510353135), (2.632421634, -1.046658491), (2.234559653, -1.005356628), (1.25, -10.489646865), (1.25, -12.5), align=None)
        with Locations((0, -7.013003779)):
            Rectangle(SKETCH7_W, SKETCH7_H)
        Polygon((-1.25, -12.5), (-1.25, -10.489646865), (-2.234559653, -1.005356628), (-2.632421634, -1.046658491), (-1.65, -10.510353135), (-1.65, -12.5), align=None)
    extrude(amount=-BOSS_EXTRUDE4_DEPTH)


with BuildPart() as body_2_1:
    # Body-Move/Copy1: read off the stored shape, not the designer's step
    # Body-Move/Copy1: moved
    add(body_2.part.moved(Location((0, -0.5, -1.1))).rotate(Axis((0, 0, 0), (1, 0, 0)), BODY_MOVE_COPY1_ANGLE))


with BuildPart() as body_2_2:
    # Body-Move/Copy2: moved
    add(body_2_1.part.moved(Location((0, 0, -2))))


solid = Compound([part.part, body_2_2.part])
